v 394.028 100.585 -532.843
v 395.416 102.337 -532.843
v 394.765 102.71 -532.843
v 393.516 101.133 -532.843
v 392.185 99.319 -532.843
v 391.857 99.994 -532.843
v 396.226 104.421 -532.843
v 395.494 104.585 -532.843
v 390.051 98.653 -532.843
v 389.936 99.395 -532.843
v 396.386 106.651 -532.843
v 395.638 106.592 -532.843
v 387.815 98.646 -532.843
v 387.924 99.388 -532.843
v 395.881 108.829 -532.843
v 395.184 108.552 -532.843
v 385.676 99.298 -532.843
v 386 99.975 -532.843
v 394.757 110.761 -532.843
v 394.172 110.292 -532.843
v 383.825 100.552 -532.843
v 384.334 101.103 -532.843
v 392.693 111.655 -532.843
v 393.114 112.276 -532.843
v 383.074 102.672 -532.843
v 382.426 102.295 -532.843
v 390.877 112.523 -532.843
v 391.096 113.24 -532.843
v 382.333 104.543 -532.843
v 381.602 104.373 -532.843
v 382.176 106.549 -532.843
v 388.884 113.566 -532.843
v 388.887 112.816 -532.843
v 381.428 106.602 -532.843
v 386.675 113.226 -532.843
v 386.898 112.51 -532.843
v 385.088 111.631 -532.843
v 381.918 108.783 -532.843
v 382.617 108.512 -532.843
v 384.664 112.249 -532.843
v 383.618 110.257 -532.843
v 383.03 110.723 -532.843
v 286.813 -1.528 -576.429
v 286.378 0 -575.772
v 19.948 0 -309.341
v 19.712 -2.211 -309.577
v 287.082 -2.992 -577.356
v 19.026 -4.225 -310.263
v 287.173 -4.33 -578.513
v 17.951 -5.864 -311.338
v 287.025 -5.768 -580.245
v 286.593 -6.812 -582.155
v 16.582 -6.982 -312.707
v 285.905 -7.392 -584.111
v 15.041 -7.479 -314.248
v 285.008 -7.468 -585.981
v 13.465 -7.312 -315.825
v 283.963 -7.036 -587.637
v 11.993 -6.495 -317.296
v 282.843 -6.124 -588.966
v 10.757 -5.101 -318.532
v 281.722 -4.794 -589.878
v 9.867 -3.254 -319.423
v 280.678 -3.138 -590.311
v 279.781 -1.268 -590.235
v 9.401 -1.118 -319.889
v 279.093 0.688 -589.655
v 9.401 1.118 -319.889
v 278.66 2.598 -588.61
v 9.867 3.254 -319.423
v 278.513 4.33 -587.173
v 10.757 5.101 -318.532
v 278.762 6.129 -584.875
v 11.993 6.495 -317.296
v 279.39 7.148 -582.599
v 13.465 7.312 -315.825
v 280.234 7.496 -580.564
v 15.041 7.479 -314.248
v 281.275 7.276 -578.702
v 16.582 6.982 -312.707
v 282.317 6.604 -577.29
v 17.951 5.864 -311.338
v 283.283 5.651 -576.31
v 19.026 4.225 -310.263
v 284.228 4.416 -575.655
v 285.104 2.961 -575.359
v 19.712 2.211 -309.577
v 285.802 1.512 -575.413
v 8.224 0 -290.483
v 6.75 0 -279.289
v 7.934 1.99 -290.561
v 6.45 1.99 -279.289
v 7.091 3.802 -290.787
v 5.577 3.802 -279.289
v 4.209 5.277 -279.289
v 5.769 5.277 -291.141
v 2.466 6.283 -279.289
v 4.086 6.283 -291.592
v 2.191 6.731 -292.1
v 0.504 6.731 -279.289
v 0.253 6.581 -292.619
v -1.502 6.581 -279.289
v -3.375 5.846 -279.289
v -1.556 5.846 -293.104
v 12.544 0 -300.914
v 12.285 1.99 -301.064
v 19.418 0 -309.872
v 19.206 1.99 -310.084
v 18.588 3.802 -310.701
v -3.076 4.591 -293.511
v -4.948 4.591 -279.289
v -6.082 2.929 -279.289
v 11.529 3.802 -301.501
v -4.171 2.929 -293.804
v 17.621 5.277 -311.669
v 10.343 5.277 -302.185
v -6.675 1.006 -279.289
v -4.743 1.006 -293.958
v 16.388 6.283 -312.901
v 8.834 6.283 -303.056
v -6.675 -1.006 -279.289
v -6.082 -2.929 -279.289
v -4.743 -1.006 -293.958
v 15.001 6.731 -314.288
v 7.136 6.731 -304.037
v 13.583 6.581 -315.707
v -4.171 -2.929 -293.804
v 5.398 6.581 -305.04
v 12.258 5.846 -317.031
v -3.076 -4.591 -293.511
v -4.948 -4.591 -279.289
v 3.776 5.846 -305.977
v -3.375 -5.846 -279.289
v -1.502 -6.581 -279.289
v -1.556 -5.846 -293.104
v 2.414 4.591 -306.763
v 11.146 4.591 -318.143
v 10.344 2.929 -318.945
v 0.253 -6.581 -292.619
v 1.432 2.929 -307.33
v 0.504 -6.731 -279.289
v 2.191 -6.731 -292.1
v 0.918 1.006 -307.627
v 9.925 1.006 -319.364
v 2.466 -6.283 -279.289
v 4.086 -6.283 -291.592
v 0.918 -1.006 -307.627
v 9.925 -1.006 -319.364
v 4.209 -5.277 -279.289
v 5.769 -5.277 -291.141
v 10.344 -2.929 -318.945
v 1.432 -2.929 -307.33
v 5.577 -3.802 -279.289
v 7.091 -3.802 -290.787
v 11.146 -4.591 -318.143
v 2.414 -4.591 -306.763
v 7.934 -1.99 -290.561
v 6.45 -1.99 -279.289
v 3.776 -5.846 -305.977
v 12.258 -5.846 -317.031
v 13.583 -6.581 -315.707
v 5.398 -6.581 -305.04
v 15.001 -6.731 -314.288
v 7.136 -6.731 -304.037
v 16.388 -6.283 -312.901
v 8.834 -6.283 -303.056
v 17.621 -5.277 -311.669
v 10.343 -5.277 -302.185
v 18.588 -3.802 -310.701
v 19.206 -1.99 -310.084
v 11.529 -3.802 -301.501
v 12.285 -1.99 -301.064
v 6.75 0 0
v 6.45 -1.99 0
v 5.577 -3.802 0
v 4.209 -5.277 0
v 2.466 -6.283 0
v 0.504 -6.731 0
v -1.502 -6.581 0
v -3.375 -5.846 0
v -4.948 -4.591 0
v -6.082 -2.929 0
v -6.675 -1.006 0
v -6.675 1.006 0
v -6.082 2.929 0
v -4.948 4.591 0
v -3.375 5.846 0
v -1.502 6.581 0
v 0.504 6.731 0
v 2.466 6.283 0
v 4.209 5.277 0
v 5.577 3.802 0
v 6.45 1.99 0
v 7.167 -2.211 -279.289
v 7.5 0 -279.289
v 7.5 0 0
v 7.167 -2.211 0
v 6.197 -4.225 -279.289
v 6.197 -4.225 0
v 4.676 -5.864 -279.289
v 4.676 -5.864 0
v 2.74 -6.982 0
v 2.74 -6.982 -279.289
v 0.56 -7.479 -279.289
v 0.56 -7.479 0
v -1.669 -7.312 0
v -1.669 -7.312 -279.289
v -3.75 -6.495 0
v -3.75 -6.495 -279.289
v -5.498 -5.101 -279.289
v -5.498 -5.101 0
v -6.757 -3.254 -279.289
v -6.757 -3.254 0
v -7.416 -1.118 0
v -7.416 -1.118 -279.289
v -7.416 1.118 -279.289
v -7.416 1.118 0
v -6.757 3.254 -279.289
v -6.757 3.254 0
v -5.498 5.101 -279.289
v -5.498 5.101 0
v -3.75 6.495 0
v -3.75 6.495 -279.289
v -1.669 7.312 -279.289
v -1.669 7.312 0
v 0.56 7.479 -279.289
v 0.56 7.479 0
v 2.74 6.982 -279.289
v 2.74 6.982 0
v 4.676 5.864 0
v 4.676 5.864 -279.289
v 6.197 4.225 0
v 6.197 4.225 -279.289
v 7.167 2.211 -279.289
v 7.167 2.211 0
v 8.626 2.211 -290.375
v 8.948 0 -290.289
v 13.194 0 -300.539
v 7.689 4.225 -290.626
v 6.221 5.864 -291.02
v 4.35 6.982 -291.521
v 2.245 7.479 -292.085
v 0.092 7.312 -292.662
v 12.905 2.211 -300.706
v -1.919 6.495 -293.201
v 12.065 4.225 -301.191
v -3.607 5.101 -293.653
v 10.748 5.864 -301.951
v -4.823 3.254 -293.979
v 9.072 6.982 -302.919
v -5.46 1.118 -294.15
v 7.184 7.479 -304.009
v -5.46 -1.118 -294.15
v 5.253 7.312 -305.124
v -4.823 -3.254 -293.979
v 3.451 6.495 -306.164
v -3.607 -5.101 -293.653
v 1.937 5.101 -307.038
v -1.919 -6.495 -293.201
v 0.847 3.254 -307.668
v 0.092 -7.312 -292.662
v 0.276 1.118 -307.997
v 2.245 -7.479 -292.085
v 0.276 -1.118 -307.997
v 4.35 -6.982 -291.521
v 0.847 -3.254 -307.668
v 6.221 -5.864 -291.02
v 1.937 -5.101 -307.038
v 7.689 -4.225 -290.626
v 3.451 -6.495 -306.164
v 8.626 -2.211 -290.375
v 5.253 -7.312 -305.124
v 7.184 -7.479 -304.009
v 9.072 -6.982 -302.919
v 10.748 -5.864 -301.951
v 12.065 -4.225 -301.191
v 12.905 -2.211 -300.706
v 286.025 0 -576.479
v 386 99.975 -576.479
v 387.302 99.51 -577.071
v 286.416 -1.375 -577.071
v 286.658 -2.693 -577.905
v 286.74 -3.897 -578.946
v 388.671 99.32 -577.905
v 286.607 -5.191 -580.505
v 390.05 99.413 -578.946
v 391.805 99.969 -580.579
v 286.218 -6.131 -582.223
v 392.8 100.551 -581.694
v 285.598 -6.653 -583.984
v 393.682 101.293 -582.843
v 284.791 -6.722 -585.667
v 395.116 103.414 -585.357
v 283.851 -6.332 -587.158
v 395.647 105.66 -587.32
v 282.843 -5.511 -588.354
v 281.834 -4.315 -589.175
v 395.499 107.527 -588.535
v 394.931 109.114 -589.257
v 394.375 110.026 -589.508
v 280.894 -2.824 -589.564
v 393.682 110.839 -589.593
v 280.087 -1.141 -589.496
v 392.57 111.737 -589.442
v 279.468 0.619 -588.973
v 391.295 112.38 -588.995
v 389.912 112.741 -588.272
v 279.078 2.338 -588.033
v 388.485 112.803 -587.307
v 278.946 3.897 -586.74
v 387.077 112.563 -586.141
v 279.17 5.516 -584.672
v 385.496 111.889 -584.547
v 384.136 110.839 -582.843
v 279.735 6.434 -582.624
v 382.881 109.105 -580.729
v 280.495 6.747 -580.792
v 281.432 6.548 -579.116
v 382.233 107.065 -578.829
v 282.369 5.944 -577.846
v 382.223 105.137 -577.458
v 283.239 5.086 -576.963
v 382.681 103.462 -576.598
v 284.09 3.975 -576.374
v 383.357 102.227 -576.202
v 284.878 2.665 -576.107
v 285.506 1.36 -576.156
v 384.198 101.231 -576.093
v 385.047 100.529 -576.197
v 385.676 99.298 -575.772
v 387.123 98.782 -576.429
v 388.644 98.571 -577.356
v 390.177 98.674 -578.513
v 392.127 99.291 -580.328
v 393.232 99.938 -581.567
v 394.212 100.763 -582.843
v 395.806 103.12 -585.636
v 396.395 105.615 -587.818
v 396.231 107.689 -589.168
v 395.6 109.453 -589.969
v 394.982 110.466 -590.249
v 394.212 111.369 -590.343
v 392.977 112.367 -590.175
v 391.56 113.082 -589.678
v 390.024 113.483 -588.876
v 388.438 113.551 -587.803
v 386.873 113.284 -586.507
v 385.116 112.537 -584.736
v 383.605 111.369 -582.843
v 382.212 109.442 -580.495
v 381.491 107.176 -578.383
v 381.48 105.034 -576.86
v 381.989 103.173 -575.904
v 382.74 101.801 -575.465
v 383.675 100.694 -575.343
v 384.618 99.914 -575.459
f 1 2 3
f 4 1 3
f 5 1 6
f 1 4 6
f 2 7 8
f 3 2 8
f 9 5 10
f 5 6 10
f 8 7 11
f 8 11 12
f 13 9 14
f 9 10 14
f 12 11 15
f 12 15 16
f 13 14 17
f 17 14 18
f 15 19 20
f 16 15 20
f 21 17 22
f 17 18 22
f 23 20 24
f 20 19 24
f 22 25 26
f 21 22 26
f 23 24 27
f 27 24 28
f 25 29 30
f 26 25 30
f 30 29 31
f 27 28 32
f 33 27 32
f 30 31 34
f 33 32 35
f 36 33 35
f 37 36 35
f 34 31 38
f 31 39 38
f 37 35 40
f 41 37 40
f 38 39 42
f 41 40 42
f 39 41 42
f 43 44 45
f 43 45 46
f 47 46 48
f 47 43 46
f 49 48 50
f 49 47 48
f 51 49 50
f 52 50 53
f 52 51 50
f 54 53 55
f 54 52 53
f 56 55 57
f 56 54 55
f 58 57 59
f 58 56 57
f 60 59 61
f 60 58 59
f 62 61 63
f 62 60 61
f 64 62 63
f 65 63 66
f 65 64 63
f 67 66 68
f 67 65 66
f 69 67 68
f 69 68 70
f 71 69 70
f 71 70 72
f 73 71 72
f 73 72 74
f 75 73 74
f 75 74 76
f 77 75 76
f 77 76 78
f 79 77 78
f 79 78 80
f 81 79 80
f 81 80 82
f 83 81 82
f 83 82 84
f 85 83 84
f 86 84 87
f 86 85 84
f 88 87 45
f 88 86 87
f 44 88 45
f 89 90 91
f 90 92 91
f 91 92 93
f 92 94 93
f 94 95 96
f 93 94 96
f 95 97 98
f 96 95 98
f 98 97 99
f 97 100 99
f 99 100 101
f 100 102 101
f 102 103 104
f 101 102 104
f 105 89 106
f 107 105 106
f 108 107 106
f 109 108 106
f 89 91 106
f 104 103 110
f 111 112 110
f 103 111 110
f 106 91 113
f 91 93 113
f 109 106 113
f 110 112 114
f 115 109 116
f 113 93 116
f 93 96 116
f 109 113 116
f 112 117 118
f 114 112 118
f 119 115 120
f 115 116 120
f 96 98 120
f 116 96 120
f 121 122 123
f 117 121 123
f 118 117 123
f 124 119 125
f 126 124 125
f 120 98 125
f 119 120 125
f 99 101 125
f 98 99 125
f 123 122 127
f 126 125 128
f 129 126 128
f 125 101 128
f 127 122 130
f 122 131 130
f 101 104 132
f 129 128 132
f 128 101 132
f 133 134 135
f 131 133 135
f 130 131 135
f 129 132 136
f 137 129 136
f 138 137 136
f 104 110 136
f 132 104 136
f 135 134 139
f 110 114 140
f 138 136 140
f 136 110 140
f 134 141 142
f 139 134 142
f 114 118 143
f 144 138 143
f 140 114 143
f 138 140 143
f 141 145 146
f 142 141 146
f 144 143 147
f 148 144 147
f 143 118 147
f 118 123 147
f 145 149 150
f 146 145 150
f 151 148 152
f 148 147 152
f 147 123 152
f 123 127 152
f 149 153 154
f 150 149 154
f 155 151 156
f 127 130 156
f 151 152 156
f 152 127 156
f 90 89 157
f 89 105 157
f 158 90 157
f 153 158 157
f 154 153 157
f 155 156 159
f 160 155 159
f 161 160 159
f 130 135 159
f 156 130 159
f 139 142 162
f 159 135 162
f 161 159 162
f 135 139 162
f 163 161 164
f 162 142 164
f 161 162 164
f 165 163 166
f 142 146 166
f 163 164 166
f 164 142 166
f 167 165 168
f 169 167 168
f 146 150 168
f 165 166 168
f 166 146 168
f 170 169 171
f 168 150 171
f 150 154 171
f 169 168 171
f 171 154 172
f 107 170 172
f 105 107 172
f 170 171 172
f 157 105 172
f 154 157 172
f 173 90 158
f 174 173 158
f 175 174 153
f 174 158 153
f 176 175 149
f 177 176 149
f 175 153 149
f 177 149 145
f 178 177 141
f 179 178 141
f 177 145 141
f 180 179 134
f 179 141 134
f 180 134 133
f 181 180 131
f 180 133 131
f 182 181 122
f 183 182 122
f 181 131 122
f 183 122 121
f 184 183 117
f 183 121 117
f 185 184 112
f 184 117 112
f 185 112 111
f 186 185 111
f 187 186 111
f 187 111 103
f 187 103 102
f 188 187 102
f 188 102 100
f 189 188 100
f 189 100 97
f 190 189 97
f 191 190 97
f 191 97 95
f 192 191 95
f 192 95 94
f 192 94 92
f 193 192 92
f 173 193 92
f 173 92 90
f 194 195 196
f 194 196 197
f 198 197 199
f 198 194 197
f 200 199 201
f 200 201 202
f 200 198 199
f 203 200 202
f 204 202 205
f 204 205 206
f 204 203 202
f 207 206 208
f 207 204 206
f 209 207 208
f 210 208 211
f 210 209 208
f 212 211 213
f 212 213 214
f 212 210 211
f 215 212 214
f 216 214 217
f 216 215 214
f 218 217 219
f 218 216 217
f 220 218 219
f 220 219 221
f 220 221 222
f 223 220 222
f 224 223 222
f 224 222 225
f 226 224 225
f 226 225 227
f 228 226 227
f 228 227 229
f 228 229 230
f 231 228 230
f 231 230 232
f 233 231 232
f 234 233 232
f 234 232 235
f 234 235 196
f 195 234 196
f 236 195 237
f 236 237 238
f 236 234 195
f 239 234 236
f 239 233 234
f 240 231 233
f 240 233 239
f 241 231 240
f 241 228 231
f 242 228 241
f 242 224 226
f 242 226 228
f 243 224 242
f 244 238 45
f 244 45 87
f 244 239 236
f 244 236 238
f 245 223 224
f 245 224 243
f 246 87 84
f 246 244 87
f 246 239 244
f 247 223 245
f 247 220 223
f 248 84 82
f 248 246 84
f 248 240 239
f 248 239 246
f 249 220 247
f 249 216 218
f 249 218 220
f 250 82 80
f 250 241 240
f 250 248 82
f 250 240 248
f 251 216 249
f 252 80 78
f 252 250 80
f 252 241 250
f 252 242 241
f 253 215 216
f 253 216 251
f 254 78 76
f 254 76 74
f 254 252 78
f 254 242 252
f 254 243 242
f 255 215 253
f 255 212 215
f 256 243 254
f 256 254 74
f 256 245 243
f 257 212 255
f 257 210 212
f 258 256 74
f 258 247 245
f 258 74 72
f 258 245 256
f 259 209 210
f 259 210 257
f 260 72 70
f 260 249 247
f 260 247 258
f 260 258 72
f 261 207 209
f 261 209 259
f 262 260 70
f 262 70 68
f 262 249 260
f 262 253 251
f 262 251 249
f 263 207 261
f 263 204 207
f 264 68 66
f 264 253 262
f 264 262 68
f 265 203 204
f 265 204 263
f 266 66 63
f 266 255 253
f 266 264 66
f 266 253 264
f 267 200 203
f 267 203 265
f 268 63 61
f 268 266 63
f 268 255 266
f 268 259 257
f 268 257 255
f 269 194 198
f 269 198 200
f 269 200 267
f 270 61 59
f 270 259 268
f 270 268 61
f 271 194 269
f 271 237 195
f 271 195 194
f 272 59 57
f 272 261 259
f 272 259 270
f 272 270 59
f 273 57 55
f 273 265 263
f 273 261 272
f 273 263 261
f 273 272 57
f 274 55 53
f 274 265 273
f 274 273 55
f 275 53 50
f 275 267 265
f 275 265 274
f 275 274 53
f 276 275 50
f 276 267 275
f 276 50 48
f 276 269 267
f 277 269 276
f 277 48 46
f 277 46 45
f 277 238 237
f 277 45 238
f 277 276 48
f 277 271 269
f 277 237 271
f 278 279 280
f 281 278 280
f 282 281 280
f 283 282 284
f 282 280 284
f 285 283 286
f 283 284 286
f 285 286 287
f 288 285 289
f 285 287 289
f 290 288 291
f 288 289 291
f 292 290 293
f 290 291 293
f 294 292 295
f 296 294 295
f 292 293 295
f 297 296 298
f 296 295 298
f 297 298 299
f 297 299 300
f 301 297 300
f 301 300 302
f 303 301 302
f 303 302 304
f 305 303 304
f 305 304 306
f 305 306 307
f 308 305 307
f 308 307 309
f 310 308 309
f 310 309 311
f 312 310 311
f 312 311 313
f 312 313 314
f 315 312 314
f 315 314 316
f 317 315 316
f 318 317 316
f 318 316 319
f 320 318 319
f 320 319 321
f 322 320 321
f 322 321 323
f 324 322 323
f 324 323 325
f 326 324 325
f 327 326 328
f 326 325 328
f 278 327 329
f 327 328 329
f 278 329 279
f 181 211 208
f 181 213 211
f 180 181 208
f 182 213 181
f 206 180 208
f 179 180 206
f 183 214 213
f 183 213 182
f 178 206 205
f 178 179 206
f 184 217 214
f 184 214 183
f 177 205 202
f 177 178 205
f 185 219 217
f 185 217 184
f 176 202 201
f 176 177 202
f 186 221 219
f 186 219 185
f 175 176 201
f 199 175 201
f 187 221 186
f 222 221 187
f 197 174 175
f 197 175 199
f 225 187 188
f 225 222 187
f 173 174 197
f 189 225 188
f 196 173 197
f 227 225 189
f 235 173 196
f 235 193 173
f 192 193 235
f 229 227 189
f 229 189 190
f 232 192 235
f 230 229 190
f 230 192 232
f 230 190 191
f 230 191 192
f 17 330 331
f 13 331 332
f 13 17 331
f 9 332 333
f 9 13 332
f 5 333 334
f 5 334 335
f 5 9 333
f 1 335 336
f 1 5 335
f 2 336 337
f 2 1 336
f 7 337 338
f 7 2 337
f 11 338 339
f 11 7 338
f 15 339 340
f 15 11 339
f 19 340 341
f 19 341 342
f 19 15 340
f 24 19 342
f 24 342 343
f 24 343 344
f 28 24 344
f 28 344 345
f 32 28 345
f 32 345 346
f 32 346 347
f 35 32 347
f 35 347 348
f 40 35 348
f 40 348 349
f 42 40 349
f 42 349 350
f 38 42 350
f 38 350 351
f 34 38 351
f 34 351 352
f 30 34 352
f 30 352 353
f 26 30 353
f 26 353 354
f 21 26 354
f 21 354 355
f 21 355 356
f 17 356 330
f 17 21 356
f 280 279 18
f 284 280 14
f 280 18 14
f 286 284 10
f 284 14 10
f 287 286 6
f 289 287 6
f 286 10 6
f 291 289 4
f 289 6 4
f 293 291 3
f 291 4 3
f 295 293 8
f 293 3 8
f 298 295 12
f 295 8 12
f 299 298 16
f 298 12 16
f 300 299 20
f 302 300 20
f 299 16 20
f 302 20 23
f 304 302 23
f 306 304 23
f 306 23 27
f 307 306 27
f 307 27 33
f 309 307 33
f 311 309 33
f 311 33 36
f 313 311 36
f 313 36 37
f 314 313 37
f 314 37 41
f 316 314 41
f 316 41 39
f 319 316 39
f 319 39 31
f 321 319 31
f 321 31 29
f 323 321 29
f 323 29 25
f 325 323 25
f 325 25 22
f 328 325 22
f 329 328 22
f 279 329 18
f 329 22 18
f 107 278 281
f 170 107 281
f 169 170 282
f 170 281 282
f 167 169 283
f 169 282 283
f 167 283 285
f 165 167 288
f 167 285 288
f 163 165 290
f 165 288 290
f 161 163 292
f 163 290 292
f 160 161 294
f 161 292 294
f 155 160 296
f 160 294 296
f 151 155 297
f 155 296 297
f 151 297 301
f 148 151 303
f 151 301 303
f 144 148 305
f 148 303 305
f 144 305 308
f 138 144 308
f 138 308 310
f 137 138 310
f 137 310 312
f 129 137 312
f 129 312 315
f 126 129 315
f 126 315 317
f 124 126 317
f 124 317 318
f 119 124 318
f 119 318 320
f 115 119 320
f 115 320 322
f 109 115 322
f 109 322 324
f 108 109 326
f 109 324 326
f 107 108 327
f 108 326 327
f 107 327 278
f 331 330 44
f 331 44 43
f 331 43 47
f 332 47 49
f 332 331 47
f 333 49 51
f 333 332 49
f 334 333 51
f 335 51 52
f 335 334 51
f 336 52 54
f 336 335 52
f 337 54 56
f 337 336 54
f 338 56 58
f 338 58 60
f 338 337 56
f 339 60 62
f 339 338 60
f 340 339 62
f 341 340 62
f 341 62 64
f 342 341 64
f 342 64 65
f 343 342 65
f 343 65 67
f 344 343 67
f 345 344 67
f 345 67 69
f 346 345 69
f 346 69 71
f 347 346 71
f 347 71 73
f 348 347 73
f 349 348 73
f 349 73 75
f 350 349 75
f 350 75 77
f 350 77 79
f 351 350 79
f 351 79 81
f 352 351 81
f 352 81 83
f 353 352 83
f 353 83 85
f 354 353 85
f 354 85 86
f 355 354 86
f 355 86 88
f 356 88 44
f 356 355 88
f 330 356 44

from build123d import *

# Parameters (mm, degrees)
F5_R   = 7.5
F5_R_2 = 6.75


with BuildPart() as f6:
    # F6: sweep along a path in F0, F2, F4
    with BuildLine(Plane.XZ) as f6_path:
        Line((0, 0), (0, -279.2893218813))
        ThreePointArc((0, -279.2893218813), (3.8060233744, -298.4234934996), (14.6446609407, -314.6446609407))
        Line((14.6446609407, -314.6446609407), (282.8427124746, -582.8427124746))
    with BuildLine(Plane.XY.offset(-582.8427124746)) as f6_path_2:
        Line((282.8427124746, 0), (388.9087296526, 106.066017178))
    with BuildLine(Plane.XZ.offset(-106.066017178)) as f6_path_3:
        Line((388.9087296526, -582.8427124746), (388.9087296526, -532.8427124746))
    # F5 (on Top) → F6 (sweep)
    with BuildSketch(Plane.XY):
        Circle(F5_R)
        Circle(F5_R_2, mode=Mode.SUBTRACT)
    sweep(path=f6_path.line + f6_path_2.line + f6_path_3.line, transition=Transition.RIGHT)


solid = f6.part
